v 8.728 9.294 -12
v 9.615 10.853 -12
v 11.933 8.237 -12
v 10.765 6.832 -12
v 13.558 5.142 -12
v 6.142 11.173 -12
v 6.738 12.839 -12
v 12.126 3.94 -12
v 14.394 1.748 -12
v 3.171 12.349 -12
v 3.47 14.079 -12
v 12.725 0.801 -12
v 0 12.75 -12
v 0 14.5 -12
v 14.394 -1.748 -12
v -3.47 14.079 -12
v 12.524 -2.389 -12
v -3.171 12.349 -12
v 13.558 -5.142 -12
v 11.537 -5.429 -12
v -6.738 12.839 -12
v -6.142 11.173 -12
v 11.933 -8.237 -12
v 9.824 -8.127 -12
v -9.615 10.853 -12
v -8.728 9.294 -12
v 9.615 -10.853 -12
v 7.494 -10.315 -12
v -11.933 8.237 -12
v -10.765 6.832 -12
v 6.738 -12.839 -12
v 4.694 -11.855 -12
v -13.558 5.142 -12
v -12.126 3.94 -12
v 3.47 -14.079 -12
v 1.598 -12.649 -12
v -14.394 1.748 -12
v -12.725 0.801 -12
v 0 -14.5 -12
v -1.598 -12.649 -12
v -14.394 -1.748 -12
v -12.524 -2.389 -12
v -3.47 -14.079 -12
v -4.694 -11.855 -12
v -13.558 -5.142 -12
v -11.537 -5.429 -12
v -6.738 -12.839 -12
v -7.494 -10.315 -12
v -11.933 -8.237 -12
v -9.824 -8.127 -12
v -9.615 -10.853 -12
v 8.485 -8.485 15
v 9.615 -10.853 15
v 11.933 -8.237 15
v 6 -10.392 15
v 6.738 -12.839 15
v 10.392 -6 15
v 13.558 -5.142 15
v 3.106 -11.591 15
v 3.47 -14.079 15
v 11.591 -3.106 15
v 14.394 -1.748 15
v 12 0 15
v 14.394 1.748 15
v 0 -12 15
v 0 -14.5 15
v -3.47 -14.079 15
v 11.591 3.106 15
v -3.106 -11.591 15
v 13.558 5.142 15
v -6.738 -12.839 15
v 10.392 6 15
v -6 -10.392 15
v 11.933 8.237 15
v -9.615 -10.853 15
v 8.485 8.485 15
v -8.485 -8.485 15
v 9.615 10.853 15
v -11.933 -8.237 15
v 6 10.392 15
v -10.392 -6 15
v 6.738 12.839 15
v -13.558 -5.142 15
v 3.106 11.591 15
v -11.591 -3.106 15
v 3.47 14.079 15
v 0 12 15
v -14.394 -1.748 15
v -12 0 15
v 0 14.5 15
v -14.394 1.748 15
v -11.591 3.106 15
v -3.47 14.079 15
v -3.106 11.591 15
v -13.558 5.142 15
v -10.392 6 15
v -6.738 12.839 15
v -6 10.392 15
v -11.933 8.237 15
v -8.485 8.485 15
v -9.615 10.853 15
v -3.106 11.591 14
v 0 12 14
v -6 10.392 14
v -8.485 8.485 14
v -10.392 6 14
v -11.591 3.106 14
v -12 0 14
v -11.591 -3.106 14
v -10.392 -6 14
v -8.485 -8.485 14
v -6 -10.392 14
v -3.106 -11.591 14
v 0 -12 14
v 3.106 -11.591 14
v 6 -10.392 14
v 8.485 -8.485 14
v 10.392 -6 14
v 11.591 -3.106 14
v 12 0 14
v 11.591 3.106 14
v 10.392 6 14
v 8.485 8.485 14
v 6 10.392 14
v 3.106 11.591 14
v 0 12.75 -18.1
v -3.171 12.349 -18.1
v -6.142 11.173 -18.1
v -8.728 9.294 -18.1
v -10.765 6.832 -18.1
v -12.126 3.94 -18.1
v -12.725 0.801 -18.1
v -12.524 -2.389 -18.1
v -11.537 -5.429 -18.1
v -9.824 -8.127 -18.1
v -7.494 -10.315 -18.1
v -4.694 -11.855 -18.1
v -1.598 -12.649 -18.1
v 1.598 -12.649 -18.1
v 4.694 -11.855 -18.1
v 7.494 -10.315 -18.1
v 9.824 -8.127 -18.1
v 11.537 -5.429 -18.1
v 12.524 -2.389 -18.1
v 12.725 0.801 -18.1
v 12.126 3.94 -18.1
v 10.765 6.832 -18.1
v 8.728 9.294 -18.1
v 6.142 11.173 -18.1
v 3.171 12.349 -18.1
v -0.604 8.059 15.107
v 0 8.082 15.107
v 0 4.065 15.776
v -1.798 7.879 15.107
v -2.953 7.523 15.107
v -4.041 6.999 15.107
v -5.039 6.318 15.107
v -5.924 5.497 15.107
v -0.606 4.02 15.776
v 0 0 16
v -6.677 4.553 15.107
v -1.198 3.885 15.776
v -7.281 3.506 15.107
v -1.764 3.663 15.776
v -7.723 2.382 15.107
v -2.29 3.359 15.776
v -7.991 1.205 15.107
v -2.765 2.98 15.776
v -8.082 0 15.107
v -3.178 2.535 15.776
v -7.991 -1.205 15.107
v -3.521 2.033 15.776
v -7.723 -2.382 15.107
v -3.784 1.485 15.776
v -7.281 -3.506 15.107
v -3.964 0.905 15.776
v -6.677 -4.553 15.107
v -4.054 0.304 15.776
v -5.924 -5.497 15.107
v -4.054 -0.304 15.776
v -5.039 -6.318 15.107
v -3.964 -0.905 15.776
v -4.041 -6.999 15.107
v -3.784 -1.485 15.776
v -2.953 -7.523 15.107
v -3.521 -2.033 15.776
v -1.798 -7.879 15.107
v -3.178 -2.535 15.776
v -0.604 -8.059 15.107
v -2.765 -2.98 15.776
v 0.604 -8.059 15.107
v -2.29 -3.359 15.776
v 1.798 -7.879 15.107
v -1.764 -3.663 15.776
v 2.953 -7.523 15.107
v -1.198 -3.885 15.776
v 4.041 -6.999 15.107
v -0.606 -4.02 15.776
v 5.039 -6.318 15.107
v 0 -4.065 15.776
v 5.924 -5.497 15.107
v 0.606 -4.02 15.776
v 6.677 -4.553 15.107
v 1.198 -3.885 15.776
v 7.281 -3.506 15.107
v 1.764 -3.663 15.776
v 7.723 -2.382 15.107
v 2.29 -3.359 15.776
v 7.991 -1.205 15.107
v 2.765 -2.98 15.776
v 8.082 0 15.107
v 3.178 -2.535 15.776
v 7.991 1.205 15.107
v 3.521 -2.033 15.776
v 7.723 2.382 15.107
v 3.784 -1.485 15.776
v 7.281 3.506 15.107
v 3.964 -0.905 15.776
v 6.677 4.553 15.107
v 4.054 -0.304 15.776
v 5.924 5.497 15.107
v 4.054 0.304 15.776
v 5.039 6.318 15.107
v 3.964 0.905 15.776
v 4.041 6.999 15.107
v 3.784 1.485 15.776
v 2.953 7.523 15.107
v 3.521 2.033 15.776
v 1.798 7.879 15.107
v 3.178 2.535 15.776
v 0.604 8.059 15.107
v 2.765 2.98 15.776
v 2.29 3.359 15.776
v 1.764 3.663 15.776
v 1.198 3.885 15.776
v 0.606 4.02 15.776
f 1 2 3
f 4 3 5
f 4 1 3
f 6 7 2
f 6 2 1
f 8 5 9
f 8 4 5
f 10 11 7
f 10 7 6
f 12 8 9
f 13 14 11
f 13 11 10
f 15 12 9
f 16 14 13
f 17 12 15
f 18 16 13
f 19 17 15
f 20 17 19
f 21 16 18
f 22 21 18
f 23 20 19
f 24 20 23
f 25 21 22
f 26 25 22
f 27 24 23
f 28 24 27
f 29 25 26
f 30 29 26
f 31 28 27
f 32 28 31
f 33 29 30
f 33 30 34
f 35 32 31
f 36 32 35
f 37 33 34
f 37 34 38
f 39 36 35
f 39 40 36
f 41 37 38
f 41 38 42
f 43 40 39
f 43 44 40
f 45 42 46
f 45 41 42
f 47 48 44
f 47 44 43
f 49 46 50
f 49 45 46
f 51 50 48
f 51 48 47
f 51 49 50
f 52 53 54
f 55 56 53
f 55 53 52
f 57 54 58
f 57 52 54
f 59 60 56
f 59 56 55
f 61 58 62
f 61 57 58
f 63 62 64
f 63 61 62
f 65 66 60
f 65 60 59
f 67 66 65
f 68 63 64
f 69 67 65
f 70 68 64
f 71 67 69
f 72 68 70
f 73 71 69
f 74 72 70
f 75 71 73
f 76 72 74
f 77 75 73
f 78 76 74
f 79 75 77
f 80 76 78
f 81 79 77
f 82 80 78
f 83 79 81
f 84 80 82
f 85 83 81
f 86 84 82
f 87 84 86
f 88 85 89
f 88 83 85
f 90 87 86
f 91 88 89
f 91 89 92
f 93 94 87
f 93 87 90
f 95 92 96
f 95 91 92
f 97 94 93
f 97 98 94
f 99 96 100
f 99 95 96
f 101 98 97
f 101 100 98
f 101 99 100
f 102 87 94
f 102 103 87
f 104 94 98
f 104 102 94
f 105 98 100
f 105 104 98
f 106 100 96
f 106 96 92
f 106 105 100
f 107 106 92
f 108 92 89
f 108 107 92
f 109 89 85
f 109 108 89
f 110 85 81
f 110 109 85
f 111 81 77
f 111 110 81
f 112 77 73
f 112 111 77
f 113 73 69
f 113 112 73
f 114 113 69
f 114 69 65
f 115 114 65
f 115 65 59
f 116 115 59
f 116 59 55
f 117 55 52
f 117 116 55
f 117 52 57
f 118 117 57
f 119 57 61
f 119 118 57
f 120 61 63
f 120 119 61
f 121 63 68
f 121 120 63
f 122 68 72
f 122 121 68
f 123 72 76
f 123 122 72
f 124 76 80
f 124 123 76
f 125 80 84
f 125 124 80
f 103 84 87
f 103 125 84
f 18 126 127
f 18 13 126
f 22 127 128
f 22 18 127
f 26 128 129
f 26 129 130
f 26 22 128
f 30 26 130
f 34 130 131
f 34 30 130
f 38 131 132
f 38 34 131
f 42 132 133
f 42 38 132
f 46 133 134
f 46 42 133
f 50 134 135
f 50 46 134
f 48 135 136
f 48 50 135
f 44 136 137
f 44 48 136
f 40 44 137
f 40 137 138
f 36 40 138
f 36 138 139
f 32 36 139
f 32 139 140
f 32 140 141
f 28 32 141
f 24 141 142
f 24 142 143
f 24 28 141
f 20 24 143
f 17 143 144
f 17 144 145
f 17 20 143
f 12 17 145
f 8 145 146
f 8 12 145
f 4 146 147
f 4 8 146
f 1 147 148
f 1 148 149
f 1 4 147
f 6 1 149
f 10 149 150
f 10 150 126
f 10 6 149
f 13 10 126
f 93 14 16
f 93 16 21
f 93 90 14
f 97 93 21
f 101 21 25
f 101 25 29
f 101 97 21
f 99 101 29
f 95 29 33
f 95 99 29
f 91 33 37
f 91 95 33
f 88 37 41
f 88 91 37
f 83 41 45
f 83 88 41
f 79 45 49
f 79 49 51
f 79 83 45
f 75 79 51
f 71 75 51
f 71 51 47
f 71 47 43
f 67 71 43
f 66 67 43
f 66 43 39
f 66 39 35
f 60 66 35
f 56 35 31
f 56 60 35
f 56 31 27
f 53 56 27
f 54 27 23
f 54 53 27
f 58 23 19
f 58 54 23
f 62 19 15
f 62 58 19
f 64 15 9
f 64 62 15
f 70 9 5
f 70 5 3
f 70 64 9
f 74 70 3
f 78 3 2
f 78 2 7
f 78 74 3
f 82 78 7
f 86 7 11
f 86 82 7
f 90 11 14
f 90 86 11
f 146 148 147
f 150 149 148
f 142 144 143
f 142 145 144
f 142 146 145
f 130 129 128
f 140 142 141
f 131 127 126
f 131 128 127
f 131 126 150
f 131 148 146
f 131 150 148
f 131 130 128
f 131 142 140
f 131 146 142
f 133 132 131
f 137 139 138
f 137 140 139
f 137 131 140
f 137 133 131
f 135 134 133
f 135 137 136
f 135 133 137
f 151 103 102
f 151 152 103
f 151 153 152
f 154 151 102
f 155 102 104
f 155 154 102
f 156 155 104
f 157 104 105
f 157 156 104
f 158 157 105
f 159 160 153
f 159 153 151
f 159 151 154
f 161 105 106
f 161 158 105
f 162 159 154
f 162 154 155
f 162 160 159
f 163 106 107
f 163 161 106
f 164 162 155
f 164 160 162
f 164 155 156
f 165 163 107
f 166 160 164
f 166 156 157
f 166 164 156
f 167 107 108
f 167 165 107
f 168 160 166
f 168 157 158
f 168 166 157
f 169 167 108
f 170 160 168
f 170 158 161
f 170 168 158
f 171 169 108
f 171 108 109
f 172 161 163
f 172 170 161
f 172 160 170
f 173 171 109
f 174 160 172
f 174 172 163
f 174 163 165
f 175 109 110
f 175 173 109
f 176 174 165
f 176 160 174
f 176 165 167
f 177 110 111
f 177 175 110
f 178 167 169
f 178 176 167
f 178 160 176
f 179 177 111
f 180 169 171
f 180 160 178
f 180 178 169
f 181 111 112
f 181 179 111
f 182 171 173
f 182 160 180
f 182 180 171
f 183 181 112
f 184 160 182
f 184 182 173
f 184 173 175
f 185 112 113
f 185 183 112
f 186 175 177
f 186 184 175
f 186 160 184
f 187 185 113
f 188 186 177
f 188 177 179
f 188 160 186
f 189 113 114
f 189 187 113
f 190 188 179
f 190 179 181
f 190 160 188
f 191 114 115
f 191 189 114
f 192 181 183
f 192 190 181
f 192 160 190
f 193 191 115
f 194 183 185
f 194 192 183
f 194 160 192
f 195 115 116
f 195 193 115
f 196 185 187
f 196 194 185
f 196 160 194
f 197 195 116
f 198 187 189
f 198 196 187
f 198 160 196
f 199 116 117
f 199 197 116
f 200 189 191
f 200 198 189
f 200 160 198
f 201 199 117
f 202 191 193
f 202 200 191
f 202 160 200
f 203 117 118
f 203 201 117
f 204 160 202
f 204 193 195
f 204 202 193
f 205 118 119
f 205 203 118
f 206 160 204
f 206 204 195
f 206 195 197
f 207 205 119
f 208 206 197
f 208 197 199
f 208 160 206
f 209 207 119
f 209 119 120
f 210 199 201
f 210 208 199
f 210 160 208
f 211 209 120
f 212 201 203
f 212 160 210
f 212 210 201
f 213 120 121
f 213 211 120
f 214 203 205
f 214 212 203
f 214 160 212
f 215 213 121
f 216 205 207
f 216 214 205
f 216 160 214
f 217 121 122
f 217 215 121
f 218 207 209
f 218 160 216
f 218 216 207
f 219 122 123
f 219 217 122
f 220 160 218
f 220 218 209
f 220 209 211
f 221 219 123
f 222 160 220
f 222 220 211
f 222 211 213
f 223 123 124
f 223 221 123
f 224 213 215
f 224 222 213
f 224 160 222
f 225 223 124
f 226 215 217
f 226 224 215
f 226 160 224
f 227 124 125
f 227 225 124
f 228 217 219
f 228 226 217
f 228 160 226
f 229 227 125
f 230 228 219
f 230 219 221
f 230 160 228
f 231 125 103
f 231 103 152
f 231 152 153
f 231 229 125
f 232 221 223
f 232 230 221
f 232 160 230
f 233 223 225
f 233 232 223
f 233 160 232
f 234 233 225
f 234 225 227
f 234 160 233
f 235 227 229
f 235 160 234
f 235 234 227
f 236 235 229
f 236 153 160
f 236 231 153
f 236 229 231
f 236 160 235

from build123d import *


with BuildPart() as part:
    # Sketch1 → Revolve1 (revolve)
    with BuildSketch(Plane(origin=(0, 0, 0), x_dir=(0, 0, -1), z_dir=(1, 0, 0))):
        with BuildLine():
            Line((-15, 14), (-15, 12))
            Line((-15, 12), (-14, 12))
            ThreePointArc((-14, 12), (-15.496575182, 6.08276253), (-16, 0))
            Line((-16, 0), (18.1, 0))
            Line((18.1, 0), (18.1, 12.75))
            Line((18.1, 12.75), (12, 12.75))
            Line((12, 12.75), (12, 14.5))
            Line((12, 14.5), (-15, 14.5))
            Line((-15, 14.5), (-15, 14))
        make_face()
    revolve(axis=Axis((0, 0, -18.1), (0, 0, 1)))


solid = part.part
